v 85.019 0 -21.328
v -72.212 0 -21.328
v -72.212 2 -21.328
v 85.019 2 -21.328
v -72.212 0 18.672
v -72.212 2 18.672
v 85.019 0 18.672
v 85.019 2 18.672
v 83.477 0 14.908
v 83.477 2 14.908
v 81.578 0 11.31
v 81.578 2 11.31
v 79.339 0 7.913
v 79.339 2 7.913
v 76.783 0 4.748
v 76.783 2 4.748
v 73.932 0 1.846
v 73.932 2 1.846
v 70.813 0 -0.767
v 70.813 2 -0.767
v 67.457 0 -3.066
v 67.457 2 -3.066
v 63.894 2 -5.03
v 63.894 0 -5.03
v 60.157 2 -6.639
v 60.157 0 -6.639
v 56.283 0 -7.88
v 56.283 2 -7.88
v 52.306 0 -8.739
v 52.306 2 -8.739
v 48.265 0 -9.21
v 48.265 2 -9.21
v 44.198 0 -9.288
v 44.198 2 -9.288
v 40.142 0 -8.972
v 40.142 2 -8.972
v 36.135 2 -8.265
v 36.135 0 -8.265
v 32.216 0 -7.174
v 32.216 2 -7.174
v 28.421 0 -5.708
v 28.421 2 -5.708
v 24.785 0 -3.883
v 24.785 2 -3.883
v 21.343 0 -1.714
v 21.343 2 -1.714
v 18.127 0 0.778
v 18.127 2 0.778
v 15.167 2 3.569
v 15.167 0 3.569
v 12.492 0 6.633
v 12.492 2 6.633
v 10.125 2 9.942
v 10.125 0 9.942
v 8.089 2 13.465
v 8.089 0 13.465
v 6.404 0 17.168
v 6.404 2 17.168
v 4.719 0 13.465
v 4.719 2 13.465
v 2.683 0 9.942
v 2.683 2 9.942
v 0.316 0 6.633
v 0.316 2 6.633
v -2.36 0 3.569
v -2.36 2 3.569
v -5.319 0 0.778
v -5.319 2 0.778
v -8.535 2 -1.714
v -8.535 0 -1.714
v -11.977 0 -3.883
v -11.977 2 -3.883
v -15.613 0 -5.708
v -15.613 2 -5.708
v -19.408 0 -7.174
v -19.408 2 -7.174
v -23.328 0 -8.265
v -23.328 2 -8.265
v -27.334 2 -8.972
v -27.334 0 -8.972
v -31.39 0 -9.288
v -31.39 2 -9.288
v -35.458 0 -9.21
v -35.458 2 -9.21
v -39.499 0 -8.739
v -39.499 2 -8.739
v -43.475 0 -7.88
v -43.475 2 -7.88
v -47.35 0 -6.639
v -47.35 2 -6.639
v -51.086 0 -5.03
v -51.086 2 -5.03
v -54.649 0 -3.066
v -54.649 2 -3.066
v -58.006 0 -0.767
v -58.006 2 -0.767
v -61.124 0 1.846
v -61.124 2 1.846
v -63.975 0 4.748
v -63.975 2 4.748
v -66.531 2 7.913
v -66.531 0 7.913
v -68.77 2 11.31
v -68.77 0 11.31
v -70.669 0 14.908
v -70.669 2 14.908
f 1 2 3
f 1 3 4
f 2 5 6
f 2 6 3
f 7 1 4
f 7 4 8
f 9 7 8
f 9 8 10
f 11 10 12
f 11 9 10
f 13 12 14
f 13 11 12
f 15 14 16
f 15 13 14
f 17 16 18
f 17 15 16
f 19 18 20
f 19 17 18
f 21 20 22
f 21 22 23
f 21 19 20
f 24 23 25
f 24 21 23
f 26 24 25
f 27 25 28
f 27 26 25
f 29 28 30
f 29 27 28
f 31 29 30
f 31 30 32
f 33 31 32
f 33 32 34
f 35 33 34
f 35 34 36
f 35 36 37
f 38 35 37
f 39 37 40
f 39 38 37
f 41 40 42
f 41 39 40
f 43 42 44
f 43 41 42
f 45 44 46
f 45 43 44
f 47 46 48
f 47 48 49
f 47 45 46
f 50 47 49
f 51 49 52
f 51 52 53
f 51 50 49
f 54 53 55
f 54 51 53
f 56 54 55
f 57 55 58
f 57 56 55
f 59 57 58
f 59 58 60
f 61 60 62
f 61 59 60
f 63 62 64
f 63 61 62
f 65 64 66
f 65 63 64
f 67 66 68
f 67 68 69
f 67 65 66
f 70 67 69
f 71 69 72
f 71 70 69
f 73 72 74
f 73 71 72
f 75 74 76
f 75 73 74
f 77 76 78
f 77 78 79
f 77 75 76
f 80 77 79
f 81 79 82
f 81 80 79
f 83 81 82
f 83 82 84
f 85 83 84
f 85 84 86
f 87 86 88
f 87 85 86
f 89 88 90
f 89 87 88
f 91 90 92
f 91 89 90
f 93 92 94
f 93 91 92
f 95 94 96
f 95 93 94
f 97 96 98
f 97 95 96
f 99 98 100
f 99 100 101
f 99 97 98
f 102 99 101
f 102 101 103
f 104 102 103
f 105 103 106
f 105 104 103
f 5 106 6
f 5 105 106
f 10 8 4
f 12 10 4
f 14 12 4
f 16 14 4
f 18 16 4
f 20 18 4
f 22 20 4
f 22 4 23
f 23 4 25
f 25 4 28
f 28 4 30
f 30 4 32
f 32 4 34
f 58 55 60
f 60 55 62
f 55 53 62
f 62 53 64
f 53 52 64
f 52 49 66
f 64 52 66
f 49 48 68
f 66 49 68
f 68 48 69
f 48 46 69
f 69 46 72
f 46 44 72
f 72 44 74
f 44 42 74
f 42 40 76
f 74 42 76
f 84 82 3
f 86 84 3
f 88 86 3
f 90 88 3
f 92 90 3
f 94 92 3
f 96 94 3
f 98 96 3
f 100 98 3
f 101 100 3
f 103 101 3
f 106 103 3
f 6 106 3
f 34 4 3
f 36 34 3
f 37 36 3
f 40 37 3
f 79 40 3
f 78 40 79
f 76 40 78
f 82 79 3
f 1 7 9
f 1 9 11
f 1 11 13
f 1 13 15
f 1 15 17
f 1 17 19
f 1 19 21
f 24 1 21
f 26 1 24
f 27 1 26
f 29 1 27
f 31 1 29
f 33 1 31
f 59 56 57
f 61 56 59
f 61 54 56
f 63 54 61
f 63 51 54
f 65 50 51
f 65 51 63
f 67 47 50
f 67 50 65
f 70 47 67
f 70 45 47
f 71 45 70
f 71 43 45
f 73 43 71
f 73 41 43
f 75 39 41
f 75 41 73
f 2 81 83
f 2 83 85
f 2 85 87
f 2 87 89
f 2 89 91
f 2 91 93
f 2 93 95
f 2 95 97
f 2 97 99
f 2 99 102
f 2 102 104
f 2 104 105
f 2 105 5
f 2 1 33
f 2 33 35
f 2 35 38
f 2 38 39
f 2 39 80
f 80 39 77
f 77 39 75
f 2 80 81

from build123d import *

# Parameters (mm, degrees)
BOSS_EXTRU_1_DEPTH = 2


with BuildPart() as part:
    # Esquisse1 → Boss.-Extru.1 (new body)
    with BuildSketch(Plane(origin=(0, 0, 0), x_dir=(1, 0, 0), z_dir=(0, 1, 0))):
        with BuildLine():
            Line((-72.21150364, 21.327505301), (85.019264112, 21.327505301))
            Line((85.019264112, 21.327505301), (85.019264112, -18.672494699))
            ThreePointArc((85.019264112, -18.672494699), (46.232543926, 9.298568327), (6.403880236, -17.167779708))
            ThreePointArc((6.403880236, -17.167779708), (-33.424783453, 9.298568327), (-72.21150364, -18.672494699))
            Line((-72.21150364, -18.672494699), (-72.21150364, 21.327505301))
        make_face()
    extrude(amount=BOSS_EXTRU_1_DEPTH)


solid = part.part
